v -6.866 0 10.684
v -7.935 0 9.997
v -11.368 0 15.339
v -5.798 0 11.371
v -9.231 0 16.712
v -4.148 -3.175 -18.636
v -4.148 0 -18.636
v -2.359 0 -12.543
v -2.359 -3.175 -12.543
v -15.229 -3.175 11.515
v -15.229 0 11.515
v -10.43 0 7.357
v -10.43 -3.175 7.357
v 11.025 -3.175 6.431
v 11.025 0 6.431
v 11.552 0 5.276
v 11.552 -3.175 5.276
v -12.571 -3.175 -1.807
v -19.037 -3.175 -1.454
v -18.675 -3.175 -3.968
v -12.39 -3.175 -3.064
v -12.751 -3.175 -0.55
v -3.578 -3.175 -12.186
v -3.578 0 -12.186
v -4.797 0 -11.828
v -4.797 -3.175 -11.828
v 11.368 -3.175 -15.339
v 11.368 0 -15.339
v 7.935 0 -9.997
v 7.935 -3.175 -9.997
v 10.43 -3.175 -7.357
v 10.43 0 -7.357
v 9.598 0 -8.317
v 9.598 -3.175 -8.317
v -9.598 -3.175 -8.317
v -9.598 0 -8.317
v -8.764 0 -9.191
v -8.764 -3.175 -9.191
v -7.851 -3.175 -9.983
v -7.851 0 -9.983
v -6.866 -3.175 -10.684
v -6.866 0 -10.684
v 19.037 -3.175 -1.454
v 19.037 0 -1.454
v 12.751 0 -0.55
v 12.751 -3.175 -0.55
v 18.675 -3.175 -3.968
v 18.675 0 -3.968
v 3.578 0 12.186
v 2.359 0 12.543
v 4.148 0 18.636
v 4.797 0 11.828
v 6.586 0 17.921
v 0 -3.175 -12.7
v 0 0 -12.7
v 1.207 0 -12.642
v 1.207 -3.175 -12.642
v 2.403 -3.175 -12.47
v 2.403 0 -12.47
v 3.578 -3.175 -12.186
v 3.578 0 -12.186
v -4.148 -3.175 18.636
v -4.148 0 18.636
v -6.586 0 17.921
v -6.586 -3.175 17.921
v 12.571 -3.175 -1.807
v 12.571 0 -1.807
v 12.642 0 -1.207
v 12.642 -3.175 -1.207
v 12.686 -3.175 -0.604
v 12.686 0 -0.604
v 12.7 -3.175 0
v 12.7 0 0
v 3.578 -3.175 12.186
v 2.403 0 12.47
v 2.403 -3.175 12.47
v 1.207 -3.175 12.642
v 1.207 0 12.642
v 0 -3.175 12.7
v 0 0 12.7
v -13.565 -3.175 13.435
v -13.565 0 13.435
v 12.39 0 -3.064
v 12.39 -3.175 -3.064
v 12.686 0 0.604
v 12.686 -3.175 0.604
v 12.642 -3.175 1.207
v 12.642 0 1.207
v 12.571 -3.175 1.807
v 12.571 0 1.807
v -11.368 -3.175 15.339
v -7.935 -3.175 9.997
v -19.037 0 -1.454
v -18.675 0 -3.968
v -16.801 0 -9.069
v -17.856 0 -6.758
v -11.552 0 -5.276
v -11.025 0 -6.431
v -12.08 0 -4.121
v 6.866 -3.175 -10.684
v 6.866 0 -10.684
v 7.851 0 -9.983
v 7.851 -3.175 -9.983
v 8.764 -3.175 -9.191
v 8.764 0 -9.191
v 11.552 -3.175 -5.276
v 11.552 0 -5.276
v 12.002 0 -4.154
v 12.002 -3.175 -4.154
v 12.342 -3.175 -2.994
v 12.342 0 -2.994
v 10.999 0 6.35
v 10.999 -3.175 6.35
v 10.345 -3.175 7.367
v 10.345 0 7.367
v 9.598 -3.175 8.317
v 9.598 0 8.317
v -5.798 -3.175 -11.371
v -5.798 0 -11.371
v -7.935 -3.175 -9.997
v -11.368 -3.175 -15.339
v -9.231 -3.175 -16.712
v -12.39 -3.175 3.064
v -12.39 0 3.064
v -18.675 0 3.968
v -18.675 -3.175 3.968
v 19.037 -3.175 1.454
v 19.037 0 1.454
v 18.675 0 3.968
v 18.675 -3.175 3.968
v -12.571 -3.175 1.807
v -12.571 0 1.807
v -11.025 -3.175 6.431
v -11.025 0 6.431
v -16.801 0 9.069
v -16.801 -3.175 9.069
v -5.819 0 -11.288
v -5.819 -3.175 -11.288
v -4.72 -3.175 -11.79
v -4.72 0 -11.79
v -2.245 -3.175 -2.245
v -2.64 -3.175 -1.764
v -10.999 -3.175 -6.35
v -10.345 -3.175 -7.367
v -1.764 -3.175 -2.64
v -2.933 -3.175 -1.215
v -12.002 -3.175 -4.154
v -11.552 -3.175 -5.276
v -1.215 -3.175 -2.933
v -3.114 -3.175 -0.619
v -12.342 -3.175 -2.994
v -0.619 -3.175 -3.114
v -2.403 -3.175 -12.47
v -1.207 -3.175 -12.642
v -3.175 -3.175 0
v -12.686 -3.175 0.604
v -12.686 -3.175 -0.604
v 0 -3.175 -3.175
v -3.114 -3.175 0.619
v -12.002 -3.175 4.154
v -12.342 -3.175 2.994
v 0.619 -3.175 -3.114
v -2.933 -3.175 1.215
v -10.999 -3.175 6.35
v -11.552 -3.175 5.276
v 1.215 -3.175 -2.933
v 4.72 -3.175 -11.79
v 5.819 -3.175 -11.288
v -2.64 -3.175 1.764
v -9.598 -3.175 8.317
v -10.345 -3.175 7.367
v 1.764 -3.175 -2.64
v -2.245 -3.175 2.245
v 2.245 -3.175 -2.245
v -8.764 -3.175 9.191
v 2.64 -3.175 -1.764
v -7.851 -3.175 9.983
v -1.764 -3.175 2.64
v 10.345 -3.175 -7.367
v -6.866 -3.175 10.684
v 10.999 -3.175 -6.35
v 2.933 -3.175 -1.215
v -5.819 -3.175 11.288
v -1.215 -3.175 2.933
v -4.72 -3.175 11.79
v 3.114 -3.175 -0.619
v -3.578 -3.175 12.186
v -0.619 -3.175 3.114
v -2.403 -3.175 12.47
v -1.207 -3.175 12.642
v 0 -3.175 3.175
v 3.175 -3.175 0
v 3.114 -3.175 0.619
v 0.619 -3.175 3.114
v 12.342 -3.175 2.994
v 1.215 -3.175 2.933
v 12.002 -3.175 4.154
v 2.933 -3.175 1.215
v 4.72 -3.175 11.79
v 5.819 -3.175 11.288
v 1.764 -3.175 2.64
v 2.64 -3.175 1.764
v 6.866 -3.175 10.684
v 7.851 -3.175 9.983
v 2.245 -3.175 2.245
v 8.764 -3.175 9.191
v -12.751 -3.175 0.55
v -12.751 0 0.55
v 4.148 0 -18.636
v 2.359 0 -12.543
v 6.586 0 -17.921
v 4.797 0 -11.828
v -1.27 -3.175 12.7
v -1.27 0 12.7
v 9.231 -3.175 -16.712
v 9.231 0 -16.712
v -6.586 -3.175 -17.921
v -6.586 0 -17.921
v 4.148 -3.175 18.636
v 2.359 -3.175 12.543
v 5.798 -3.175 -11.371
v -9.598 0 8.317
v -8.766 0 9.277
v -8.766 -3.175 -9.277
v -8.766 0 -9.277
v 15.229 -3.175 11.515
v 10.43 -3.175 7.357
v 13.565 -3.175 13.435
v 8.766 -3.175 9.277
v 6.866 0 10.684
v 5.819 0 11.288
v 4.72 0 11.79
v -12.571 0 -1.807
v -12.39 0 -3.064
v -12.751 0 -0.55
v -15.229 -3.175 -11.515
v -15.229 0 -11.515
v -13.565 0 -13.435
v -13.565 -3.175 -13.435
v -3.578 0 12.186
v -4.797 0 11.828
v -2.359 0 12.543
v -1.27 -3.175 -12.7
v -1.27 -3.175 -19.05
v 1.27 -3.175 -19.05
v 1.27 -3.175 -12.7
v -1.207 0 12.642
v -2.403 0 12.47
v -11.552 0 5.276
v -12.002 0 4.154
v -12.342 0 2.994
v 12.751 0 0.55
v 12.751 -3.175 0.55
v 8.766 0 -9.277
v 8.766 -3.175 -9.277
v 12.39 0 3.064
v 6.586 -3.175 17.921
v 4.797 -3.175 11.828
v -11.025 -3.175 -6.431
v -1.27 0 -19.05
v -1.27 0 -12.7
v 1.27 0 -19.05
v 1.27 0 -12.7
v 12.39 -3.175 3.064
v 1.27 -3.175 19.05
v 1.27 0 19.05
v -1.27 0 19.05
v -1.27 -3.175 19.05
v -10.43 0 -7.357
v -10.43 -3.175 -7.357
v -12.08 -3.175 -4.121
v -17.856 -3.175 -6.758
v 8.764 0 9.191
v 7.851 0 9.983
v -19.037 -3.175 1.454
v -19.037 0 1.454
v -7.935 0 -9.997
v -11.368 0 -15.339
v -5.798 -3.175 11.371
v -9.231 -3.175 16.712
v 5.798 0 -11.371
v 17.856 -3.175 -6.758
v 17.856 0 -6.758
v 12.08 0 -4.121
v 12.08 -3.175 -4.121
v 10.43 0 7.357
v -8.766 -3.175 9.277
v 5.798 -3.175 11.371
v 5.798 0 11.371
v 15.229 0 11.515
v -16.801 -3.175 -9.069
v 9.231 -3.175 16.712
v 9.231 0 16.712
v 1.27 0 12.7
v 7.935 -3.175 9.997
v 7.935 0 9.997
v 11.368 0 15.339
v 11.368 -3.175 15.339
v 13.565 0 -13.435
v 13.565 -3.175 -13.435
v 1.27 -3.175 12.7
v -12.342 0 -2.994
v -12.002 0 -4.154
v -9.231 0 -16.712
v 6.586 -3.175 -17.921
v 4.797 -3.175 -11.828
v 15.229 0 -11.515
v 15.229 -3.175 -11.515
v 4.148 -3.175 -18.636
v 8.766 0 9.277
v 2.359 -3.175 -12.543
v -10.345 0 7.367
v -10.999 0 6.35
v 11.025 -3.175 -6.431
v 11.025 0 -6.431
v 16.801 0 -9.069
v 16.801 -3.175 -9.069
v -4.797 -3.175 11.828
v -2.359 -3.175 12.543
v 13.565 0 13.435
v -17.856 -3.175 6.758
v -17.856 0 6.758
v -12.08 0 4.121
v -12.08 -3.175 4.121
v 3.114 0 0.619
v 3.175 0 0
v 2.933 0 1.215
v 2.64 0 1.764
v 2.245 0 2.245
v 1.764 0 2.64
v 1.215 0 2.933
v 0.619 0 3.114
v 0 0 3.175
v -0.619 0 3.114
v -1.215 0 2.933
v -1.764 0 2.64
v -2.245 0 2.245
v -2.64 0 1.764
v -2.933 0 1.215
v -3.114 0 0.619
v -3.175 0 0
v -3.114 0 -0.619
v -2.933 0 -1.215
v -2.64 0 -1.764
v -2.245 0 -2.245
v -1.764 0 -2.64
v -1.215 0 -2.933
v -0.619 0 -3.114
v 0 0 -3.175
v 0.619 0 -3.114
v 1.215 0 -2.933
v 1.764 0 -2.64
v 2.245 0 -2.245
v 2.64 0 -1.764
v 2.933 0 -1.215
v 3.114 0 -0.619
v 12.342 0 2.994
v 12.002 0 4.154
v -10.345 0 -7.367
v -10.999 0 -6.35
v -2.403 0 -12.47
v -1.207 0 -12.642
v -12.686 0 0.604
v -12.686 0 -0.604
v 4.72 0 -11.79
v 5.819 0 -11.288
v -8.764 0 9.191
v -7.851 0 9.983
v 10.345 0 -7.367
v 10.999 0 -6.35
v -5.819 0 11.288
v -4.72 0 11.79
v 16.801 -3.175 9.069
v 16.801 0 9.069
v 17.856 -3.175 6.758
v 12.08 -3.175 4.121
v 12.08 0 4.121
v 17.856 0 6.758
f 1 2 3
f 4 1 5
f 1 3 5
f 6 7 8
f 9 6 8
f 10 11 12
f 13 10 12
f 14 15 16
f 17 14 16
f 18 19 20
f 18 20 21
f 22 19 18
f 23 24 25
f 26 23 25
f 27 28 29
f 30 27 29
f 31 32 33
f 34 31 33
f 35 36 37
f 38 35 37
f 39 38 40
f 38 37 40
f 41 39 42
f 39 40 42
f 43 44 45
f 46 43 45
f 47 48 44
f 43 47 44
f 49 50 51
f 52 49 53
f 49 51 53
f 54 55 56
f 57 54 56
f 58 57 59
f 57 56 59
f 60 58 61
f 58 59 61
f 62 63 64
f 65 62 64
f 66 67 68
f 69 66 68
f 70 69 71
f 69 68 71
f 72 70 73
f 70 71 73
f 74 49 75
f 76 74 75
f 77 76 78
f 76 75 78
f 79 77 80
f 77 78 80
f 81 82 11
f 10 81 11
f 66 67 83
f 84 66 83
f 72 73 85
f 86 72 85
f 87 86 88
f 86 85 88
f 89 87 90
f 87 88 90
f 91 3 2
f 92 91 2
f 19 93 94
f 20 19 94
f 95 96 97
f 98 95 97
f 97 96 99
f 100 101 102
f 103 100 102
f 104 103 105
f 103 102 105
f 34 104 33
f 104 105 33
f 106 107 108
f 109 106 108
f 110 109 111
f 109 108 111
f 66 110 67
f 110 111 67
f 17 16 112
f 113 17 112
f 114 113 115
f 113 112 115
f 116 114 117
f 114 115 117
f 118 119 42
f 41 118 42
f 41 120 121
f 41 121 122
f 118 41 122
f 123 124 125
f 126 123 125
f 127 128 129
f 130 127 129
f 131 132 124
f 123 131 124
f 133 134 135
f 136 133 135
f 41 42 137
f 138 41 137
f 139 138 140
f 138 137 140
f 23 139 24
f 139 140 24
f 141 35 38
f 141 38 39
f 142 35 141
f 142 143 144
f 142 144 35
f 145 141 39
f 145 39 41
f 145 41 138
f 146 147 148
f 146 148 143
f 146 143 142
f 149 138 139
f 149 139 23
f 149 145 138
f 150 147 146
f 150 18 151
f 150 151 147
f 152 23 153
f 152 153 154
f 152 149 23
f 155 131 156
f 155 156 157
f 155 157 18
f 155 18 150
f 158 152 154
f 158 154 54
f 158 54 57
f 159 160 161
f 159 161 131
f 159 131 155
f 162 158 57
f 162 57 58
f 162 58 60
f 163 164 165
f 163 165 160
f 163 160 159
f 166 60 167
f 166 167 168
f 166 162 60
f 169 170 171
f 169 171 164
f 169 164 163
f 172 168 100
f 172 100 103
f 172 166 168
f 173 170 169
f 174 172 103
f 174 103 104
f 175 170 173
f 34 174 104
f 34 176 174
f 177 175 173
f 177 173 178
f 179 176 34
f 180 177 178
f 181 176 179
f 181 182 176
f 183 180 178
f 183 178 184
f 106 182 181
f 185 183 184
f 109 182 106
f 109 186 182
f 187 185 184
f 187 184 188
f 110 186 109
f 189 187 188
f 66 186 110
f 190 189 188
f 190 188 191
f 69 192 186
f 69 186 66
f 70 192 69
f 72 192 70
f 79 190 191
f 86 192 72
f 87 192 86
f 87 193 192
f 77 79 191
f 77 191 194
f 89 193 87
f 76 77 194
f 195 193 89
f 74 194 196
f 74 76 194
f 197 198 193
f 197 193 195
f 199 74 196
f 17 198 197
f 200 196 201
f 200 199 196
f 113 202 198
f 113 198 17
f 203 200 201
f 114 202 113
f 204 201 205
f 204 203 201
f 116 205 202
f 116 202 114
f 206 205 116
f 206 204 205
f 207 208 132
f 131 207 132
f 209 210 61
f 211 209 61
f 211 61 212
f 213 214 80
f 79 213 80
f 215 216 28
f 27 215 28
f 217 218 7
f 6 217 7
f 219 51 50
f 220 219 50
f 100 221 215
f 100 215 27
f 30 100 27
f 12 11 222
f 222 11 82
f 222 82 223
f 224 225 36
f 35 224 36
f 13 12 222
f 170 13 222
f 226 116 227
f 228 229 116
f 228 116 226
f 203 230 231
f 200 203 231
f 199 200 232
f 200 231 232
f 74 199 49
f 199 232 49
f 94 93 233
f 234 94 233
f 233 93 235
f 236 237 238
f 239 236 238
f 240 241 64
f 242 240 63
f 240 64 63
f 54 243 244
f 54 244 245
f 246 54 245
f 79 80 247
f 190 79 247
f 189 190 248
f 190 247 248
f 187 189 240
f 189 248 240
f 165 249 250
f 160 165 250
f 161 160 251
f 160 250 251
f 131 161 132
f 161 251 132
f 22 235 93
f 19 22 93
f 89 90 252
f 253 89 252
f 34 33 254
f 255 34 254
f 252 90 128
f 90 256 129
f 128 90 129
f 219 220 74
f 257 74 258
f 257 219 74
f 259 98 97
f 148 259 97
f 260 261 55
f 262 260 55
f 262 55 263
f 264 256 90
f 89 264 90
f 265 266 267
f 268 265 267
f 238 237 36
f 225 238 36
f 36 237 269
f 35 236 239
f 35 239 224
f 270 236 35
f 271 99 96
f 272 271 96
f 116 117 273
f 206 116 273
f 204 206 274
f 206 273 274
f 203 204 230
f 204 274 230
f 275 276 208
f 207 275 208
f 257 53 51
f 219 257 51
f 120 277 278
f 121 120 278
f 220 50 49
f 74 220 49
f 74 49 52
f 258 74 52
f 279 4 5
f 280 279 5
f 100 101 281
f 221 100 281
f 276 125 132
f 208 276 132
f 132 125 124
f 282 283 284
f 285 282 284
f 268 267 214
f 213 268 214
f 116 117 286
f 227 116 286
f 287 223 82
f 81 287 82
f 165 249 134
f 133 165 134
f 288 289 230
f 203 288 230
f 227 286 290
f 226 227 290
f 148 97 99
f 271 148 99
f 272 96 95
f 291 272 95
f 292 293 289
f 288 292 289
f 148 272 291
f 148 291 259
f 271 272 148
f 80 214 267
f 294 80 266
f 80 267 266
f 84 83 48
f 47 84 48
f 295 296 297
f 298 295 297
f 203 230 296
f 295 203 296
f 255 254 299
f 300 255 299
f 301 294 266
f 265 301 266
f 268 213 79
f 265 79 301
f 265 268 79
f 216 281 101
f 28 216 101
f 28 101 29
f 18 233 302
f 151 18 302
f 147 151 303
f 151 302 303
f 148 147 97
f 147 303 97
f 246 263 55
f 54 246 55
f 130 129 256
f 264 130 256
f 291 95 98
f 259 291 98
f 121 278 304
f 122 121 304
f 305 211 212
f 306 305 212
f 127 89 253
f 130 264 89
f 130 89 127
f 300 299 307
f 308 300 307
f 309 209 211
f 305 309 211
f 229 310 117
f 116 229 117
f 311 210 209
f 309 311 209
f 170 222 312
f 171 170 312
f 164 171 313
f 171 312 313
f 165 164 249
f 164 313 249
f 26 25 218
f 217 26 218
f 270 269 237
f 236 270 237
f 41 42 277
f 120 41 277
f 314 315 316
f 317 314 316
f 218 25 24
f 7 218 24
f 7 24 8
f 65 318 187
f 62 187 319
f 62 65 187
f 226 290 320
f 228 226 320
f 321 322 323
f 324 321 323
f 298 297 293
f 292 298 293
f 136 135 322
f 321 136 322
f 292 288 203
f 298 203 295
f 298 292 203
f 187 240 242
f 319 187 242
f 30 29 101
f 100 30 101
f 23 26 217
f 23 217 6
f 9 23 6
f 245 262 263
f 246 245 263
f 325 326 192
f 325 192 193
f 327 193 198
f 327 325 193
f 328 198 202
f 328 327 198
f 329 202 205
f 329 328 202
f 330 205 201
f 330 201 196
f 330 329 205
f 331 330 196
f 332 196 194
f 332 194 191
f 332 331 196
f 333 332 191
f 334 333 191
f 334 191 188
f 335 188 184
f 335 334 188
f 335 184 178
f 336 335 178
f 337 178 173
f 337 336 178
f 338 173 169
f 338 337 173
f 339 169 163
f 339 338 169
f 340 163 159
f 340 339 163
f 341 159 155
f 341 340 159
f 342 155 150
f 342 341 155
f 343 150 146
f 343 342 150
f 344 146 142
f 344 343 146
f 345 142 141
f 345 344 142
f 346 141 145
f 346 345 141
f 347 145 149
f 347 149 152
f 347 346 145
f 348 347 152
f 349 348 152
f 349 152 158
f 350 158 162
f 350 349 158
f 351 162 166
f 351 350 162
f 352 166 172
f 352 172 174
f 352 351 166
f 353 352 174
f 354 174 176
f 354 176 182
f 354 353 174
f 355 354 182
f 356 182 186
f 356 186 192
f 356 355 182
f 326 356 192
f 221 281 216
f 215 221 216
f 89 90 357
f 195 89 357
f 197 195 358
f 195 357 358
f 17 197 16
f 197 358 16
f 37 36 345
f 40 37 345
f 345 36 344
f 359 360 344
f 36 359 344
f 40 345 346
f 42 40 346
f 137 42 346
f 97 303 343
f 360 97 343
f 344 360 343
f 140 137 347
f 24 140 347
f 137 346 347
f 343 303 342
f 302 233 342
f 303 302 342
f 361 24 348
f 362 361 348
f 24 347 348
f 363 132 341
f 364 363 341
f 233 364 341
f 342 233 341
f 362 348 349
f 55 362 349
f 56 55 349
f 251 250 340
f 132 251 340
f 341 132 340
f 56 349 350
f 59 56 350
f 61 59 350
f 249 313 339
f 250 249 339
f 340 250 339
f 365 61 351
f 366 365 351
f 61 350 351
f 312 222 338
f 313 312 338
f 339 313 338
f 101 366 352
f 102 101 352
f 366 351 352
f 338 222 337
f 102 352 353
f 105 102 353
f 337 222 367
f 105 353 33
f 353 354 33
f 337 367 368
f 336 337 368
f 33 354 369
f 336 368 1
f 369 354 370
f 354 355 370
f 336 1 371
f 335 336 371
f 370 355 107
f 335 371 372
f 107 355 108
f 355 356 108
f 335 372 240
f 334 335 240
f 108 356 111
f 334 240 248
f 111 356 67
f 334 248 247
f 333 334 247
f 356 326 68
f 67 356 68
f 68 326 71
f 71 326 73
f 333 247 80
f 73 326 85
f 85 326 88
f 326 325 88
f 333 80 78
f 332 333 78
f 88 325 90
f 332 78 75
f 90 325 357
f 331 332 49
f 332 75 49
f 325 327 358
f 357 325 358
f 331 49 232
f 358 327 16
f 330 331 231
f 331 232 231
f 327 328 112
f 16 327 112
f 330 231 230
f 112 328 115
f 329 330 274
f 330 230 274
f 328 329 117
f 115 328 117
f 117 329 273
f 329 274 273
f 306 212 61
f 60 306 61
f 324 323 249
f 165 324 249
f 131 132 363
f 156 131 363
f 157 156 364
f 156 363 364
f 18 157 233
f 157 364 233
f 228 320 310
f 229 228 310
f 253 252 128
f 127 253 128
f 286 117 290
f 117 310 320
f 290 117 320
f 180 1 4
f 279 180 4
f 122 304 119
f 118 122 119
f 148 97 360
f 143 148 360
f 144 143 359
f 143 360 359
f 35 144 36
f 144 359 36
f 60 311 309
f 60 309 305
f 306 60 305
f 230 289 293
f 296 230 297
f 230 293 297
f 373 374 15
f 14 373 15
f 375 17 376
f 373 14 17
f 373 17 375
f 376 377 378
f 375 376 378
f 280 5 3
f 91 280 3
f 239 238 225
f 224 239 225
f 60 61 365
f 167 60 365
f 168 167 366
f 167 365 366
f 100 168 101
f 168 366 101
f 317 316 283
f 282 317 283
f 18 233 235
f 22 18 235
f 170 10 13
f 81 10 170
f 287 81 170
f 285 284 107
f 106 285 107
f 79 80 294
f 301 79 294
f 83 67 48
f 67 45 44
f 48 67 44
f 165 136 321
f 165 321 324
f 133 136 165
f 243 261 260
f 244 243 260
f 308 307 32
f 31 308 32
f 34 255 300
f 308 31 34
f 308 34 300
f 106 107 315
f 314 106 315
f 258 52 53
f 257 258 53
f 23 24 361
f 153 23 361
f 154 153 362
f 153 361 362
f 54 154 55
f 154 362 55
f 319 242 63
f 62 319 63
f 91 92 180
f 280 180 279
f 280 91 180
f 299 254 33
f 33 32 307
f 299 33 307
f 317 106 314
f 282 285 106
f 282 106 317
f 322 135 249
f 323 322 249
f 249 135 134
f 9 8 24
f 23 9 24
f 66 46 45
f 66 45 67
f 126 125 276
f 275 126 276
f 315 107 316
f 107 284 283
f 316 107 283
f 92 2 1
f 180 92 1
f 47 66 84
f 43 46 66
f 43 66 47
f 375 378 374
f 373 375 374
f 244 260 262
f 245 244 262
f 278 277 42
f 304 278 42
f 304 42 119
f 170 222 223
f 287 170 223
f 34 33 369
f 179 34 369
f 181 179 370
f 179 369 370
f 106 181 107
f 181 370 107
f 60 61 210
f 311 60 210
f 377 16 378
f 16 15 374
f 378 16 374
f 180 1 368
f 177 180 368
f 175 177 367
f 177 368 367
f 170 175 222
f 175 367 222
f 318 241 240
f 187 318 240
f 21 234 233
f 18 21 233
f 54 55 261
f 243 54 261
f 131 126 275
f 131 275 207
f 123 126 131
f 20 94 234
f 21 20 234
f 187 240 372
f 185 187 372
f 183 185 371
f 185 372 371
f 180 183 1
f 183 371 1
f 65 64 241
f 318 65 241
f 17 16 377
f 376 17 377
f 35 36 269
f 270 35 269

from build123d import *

# Parameters (mm, degrees)
F0_R     = 3.175
F1_DEPTH = 3.175


with BuildPart() as f1:
    # F0 (on Front) → F1 (new body)
    with BuildSketch(Plane.XZ):
        with BuildLine():
            ThreePointArc((12.570732, -1.807398), (12.667642, -0.906008), (12.7, 0))
            ThreePointArc((12.7, 0), (12.667642, 0.906008), (12.570732, 1.807398))
            ThreePointArc((12.570732, 1.807398), (12.185561, 3.578003), (11.552326, 5.275771))
            ThreePointArc((11.552326, 5.275771), (10.68392, 6.866138), (9.59802, 8.316731))
            ThreePointArc((9.59802, 8.316731), (8.316732, 9.598019), (6.86614, 10.683919))
            ThreePointArc((6.86614, 10.683919), (5.275771, 11.552326), (3.578004, 12.185561))
            ThreePointArc((3.578004, 12.185561), (1.807399, 12.570732), (0, 12.7))
            ThreePointArc((0, 12.7), (-1.807398, 12.570732), (-3.578003, 12.185561))
            ThreePointArc((-3.578003, 12.185561), (-5.275771, 11.552326), (-6.86614, 10.683919))
            ThreePointArc((-6.86614, 10.683919), (-8.316732, 9.598019), (-9.59802, 8.316731))
            ThreePointArc((-9.59802, 8.316731), (-10.68392, 6.866138), (-11.552326, 5.275771))
            ThreePointArc((-11.552326, 5.275771), (-12.185561, 3.578004), (-12.570732, 1.807398))
            ThreePointArc((-12.570732, 1.807398), (-12.7, 0), (-12.570732, -1.807398))
            ThreePointArc((-12.570732, -1.807398), (-12.185561, -3.578003), (-11.552326, -5.275771))
            ThreePointArc((-11.552326, -5.275771), (-10.68392, -6.866138), (-9.59802, -8.316731))
            ThreePointArc((-9.59802, -8.316731), (-8.316732, -9.598019), (-6.86614, -10.683919))
            ThreePointArc((-6.86614, -10.683919), (-5.275771, -11.552326), (-3.578003, -12.185561))
            ThreePointArc((-3.578003, -12.185561), (-1.807398, -12.570732), (0, -12.7))
            ThreePointArc((0, -12.7), (1.807398, -12.570732), (3.578003, -12.185561))
            ThreePointArc((3.578003, -12.185561), (5.275771, -11.552326), (6.86614, -10.683919))
            ThreePointArc((6.86614, -10.683919), (8.316732, -9.598019), (9.59802, -8.316731))
            ThreePointArc((9.59802, -8.316731), (10.68392, -6.866138), (11.552326, -5.275771))
            ThreePointArc((11.552326, -5.275771), (12.185561, -3.578003), (12.570732, -1.807398))
        make_face()
        Circle(F0_R, mode=Mode.SUBTRACT)
        Polygon((12.751472, -0.550325), (12.570732, -1.807398), (12.389992, -3.064472), (18.675359, -3.968171), (19.036838, -1.454024), align=None)
        Polygon((12.079903, -4.120538), (11.552326, -5.275771), (11.024749, -6.431003), (16.800912, -9.068889), (17.856067, -6.758423), align=None)
        Polygon((10.429693, -7.356929), (9.59802, -8.316731), (8.766346, -9.276533), (13.565356, -13.434899), (15.228703, -11.515295), align=None)
        Polygon((7.93453, -9.997306), (6.86614, -10.683919), (5.797746, -11.370534), (9.230816, -16.712494), (11.3676, -15.339266), align=None)
        Polygon((4.79656, -11.82776), (3.578003, -12.185561), (2.359447, -12.543361), (4.148449, -18.636141), (6.585561, -17.920541), align=None)
        Polygon((1.27, -12.7), (0, -12.7), (-1.27, -12.7), (-1.27, -19.05), (1.27, -19.05), align=None)
        Polygon((-2.359447, -12.543361), (-3.578003, -12.185561), (-4.79656, -11.82776), (-6.585561, -17.920541), (-4.148449, -18.636141), align=None)
        Polygon((-5.797746, -11.370534), (-6.86614, -10.683919), (-7.93453, -9.997306), (-11.3676, -15.339266), (-9.230816, -16.712494), align=None)
        Polygon((-8.766346, -9.276533), (-9.59802, -8.316731), (-10.429693, -7.356929), (-15.228703, -11.515295), (-13.565356, -13.434899), align=None)
        Polygon((-11.024749, -6.431003), (-11.552326, -5.275771), (-12.079903, -4.120538), (-17.856067, -6.758423), (-16.800912, -9.068889), align=None)
        Polygon((-12.389992, -3.064472), (-12.570732, -1.807398), (-12.751472, -0.550325), (-19.036838, -1.454024), (-18.675359, -3.968171), align=None)
        Polygon((-12.751472, 0.550325), (-12.570732, 1.807398), (-12.389992, 3.064472), (-18.675359, 3.968171), (-19.036838, 1.454024), align=None)
        Polygon((-12.079903, 4.120538), (-11.552326, 5.275771), (-11.024749, 6.431003), (-16.800912, 9.068889), (-17.856067, 6.758423), align=None)
        Polygon((-10.429693, 7.356929), (-9.59802, 8.316731), (-8.766346, 9.276533), (-13.565356, 13.434899), (-15.228703, 11.515295), align=None)
        Polygon((-7.93453, 9.997306), (-6.86614, 10.683919), (-5.797746, 11.370534), (-9.230816, 16.712494), (-11.3676, 15.339266), align=None)
        Polygon((-4.79656, 11.82776), (-3.578003, 12.185561), (-2.359447, 12.543361), (-4.148449, 18.636141), (-6.585561, 17.920541), align=None)
        Polygon((-1.27, 12.7), (0, 12.7), (1.27, 12.7), (1.27, 19.05), (-1.27, 19.05), align=None)
        Polygon((2.359447, 12.543361), (3.578004, 12.185561), (4.79656, 11.82776), (6.585561, 17.920541), (4.148449, 18.636141), align=None)
        Polygon((5.797746, 11.370534), (6.86614, 10.683919), (7.93453, 9.997306), (11.3676, 15.339266), (9.230816, 16.712494), align=None)
        Polygon((8.766346, 9.276533), (9.59802, 8.316731), (10.429693, 7.356929), (15.228703, 11.515295), (13.565356, 13.434899), align=None)
        Polygon((11.024749, 6.431003), (11.552326, 5.275771), (12.079903, 4.120538), (17.856067, 6.758423), (16.800912, 9.068889), align=None)
        Polygon((12.389992, 3.064472), (12.570732, 1.807398), (12.751472, 0.550325), (19.036838, 1.454024), (18.675359, 3.968171), align=None)
    extrude(amount=F1_DEPTH)


solid = f1.part
